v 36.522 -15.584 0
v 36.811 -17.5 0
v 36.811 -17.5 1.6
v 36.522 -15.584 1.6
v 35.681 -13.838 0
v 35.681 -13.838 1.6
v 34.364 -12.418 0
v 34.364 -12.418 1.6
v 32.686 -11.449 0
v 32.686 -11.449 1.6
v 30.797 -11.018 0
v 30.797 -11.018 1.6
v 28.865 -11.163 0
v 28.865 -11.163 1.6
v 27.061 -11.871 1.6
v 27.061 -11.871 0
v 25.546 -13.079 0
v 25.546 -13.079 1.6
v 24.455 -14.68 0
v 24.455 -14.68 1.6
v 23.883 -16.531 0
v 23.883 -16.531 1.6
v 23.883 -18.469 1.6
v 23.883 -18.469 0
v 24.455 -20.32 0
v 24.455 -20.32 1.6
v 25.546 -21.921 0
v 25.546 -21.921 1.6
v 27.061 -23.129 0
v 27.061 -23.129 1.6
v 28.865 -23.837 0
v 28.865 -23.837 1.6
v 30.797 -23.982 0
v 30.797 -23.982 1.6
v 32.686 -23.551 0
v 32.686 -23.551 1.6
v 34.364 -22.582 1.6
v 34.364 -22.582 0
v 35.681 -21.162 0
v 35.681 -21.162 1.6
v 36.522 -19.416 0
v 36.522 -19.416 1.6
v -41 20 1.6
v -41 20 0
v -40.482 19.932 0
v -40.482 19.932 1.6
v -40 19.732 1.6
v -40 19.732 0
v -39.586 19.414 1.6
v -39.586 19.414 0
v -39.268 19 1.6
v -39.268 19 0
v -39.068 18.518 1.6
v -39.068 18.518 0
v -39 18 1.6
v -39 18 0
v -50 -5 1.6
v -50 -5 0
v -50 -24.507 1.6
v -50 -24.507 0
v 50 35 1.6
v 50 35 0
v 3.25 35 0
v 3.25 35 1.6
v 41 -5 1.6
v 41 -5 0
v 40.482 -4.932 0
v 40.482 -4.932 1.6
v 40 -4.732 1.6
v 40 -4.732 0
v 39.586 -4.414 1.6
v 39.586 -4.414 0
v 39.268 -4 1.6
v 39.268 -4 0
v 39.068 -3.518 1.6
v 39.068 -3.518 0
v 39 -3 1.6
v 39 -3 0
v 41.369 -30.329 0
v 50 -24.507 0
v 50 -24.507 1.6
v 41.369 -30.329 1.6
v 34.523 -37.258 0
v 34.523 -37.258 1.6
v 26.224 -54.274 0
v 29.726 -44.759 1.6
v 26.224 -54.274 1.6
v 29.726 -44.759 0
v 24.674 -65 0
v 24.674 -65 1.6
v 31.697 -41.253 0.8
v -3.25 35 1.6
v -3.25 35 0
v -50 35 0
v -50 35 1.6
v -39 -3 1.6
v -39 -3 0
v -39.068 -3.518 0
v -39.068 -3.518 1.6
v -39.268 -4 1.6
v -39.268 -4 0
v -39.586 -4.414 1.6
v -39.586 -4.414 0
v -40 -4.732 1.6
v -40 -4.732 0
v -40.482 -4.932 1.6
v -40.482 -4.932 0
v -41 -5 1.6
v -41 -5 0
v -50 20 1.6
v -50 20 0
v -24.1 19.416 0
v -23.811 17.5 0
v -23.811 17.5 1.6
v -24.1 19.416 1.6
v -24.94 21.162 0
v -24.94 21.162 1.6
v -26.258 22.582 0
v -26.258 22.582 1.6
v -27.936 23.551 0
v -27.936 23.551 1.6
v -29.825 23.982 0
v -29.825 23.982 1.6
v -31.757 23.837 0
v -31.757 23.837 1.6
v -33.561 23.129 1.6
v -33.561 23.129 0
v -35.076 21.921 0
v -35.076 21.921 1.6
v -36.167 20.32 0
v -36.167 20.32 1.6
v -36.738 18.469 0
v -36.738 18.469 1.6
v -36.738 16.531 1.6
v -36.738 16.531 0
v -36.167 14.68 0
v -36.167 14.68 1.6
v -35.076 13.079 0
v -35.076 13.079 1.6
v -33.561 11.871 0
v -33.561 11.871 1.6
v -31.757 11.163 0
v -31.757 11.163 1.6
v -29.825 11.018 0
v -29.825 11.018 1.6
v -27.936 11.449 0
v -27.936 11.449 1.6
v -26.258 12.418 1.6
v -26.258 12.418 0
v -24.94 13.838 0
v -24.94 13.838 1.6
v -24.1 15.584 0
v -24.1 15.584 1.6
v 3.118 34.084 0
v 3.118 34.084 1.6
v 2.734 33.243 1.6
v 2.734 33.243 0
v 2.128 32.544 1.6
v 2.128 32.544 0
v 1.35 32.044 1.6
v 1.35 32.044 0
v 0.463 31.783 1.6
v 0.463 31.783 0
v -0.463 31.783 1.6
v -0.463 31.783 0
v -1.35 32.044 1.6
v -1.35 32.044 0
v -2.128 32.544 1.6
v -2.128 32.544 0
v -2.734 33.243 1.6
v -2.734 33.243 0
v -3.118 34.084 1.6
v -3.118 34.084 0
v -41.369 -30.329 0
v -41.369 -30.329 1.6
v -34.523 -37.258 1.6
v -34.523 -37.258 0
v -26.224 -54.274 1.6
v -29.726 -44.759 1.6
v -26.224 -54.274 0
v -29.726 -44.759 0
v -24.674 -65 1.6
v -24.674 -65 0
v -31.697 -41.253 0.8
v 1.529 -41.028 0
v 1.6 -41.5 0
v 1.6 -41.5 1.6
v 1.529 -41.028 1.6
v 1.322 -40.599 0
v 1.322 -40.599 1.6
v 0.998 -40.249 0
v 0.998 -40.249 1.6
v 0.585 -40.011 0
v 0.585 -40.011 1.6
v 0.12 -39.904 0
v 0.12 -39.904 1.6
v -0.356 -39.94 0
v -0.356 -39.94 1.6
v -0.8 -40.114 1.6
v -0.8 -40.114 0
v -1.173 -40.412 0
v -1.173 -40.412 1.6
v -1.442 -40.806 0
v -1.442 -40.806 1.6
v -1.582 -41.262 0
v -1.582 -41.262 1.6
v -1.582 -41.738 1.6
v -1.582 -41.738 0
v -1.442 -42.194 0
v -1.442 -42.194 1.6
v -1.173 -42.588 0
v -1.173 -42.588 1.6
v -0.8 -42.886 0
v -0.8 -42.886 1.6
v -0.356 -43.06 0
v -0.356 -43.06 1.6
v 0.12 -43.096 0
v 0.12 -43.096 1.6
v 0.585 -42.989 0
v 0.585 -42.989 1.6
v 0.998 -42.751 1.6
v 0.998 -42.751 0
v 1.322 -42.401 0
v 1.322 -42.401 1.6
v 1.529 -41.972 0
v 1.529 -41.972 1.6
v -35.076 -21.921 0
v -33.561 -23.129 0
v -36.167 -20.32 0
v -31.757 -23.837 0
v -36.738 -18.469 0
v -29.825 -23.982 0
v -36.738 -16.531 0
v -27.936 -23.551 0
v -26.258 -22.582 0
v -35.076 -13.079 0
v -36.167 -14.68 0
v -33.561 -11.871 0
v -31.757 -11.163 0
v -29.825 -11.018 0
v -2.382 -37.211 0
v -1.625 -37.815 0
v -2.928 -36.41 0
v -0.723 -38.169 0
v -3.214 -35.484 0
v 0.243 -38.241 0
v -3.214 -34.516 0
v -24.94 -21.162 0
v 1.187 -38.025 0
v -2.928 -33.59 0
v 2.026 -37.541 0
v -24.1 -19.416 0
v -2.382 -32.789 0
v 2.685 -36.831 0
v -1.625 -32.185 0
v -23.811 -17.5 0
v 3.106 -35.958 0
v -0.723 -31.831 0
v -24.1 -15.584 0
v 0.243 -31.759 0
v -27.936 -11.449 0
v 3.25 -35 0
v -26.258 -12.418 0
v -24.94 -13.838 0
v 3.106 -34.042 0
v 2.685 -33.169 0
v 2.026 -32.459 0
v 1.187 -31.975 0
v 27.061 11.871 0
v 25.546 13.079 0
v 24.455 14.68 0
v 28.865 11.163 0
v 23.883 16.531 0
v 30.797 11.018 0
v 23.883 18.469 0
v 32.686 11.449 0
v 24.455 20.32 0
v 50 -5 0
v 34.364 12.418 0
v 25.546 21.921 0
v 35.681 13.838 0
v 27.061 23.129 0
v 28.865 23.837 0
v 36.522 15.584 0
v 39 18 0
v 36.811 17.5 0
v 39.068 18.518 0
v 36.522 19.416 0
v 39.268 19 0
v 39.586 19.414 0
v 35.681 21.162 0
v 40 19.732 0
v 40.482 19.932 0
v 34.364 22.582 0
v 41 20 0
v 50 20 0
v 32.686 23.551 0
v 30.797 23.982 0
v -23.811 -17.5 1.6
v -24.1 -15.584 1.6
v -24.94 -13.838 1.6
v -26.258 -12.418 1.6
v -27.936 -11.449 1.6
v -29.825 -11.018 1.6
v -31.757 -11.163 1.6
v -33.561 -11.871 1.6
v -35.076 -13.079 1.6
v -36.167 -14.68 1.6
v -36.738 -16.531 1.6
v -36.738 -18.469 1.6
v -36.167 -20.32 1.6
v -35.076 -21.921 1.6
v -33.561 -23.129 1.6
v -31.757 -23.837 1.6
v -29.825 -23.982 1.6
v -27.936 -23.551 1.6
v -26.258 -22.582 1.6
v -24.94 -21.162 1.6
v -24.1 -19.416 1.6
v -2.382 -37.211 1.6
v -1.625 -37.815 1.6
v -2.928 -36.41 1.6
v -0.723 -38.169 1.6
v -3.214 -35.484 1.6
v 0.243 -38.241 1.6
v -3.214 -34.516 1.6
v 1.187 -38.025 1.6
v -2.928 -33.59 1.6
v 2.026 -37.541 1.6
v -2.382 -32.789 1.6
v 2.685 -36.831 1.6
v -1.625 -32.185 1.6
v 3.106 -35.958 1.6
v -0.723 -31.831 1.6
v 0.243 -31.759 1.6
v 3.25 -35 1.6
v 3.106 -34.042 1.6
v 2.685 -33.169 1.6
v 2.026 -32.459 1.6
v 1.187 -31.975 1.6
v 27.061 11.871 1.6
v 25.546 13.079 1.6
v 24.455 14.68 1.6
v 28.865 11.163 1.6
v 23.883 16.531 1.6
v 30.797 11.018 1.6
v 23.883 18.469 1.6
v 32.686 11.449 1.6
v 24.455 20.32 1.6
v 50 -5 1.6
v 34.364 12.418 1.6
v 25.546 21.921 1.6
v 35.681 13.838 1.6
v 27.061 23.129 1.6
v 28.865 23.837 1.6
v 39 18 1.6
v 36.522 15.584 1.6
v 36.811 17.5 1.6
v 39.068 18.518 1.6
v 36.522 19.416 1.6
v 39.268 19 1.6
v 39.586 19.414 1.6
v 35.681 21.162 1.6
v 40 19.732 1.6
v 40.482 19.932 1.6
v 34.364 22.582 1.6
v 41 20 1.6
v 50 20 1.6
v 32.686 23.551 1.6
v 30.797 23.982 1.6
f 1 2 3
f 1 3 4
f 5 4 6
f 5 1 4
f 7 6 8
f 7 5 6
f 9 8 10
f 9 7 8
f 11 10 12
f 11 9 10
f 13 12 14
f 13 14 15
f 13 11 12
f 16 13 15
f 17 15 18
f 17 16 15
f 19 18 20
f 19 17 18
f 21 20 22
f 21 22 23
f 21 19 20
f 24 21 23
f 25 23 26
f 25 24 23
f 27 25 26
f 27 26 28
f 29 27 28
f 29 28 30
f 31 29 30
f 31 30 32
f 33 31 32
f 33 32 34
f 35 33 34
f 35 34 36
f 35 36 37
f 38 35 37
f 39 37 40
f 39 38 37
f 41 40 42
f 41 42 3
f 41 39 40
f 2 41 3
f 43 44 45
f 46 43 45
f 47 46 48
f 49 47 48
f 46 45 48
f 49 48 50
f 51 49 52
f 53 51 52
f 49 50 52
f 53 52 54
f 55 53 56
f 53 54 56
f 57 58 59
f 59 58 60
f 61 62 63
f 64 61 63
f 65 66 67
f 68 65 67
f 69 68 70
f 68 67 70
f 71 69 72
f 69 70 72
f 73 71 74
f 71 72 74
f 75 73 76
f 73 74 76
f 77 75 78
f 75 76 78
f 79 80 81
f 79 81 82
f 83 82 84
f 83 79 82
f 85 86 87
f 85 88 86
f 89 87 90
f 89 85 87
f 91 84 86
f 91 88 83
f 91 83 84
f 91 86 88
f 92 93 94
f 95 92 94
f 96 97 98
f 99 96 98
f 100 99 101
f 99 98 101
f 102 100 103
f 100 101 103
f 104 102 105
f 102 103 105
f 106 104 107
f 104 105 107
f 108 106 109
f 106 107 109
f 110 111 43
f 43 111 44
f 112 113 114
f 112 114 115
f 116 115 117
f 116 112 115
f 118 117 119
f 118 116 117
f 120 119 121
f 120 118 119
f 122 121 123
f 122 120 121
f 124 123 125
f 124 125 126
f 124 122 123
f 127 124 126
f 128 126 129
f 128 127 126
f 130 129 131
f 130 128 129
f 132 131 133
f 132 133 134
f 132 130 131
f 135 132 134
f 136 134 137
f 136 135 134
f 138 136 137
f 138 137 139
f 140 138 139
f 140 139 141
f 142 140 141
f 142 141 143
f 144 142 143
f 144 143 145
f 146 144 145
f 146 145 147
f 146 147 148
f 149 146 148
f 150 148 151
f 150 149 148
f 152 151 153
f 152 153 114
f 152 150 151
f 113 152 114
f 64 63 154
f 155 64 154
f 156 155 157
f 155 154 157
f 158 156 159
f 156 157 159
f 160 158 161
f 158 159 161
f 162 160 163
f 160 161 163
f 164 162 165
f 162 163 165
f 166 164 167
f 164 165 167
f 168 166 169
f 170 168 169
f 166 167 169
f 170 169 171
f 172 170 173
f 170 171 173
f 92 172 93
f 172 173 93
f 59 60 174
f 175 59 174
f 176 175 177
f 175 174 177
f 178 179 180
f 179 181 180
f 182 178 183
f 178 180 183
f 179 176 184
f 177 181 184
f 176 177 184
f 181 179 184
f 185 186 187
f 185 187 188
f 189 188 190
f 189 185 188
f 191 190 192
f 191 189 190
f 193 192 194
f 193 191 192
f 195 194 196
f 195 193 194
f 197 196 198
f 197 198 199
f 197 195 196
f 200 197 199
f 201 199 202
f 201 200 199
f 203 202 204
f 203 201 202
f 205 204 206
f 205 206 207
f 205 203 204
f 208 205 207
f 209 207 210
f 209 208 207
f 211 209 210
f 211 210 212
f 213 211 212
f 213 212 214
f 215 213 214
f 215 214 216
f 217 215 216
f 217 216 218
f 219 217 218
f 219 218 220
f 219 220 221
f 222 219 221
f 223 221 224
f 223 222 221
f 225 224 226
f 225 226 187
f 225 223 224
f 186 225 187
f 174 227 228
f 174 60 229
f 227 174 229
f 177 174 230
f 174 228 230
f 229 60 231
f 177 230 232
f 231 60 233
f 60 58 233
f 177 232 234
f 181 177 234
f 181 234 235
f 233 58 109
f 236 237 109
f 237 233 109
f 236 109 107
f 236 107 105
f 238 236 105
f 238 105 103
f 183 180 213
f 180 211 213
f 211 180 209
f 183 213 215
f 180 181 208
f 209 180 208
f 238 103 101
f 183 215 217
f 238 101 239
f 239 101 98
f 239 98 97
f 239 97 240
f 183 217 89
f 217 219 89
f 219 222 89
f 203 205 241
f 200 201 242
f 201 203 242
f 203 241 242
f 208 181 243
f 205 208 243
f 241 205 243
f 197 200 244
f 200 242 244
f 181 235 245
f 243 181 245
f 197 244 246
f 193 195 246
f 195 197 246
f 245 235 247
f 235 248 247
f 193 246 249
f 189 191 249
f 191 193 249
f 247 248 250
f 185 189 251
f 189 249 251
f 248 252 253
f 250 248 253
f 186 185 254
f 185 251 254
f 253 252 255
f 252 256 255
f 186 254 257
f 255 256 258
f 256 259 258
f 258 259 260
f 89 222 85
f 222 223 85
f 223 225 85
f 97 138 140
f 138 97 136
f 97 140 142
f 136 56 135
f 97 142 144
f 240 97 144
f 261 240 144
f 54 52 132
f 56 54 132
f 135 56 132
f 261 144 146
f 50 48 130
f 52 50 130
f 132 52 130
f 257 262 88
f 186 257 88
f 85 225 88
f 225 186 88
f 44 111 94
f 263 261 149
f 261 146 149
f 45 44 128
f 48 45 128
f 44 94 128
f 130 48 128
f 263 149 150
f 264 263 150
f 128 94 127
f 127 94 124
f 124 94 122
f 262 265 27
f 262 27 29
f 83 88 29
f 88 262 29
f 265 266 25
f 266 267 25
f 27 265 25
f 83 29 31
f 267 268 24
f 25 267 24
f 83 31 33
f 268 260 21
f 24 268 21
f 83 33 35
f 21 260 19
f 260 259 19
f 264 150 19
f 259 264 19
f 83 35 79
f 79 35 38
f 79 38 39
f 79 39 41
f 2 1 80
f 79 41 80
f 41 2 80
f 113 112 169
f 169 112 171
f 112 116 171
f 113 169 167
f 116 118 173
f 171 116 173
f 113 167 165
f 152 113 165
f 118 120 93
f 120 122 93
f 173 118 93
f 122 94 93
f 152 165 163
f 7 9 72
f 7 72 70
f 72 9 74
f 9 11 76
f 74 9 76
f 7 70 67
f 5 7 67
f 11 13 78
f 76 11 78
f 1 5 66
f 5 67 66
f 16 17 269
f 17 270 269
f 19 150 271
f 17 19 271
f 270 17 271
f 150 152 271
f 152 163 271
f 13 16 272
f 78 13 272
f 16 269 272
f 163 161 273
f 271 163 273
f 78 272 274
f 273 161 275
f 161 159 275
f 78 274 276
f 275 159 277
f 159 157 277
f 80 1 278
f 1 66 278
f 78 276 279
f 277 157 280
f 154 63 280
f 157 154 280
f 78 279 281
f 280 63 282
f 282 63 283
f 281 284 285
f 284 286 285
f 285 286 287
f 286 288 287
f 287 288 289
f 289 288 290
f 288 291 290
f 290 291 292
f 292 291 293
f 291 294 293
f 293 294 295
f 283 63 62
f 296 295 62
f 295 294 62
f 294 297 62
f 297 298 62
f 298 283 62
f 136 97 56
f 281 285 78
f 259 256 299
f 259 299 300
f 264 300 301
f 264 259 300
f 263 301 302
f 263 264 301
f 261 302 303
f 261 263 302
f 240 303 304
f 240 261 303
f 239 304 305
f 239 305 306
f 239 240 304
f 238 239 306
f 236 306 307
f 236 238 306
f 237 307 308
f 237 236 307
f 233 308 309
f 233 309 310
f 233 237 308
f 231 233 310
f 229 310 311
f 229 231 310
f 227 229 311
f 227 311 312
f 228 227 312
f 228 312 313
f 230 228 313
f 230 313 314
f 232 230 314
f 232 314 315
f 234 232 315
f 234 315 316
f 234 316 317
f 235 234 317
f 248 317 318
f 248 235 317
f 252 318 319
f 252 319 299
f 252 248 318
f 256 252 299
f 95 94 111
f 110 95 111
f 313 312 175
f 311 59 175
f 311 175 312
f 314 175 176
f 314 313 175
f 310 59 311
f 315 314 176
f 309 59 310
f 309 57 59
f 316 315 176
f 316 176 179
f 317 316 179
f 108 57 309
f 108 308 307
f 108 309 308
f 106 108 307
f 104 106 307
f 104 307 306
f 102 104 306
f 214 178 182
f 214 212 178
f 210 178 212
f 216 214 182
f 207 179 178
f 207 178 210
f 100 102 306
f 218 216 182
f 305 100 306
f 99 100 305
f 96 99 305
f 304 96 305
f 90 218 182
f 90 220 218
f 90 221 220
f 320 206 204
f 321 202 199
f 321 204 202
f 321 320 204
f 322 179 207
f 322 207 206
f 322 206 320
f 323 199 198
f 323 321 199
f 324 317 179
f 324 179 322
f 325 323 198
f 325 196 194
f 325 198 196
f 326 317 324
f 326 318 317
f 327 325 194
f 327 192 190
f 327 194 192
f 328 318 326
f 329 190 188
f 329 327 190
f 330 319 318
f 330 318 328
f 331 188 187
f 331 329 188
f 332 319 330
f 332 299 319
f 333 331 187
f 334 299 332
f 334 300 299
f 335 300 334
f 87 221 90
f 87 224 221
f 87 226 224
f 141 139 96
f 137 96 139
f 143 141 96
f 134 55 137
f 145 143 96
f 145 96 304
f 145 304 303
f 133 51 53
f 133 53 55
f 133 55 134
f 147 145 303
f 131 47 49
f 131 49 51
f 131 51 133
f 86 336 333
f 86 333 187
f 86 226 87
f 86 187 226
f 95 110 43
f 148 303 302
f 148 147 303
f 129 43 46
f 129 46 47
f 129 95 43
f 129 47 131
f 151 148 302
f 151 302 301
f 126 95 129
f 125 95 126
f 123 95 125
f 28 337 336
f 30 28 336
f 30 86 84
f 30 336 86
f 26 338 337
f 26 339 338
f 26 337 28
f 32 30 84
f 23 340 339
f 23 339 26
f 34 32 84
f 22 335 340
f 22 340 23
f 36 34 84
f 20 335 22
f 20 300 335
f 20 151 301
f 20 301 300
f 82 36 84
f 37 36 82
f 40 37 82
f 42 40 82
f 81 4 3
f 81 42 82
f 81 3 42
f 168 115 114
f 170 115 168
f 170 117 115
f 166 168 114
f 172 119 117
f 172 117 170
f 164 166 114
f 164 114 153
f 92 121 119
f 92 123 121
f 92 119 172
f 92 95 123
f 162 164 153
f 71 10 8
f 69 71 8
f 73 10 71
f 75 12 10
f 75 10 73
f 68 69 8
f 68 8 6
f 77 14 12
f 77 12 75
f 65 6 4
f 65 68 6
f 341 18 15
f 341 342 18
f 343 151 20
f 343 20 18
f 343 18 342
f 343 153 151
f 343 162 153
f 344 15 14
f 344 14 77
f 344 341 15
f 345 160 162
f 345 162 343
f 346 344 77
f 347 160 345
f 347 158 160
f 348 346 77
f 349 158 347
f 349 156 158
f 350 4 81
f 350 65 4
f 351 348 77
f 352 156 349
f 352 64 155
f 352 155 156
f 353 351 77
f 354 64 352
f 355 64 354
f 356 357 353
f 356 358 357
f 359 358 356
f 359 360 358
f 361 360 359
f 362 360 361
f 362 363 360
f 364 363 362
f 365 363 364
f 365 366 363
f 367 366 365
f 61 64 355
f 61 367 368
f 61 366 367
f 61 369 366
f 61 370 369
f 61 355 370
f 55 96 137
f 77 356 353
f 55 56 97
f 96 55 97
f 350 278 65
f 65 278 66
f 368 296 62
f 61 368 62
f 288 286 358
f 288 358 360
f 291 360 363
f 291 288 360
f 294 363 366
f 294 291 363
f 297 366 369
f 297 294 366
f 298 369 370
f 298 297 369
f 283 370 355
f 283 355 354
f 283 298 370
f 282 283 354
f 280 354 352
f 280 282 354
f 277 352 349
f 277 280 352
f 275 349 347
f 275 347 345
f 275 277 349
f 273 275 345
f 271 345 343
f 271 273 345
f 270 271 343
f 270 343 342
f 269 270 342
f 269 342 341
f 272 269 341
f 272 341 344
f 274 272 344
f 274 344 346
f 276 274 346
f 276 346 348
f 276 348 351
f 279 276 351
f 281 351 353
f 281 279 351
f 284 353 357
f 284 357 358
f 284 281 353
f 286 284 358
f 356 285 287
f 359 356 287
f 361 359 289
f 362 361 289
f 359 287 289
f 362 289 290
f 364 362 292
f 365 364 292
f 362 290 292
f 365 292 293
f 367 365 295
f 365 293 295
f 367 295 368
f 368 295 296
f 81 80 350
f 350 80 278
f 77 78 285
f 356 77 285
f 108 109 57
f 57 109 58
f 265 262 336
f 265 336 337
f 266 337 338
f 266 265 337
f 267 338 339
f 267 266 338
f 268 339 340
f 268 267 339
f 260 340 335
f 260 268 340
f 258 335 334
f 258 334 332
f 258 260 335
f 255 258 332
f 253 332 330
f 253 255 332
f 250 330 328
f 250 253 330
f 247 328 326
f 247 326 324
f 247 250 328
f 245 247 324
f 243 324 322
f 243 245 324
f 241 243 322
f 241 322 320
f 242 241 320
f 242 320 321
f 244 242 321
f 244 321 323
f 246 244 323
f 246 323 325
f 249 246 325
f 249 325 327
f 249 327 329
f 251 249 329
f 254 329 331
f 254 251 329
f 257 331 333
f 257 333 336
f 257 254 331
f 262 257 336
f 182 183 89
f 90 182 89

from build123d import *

# Parameters (mm, degrees)
SKETCH_1_R      = 3.25
SKETCH_1_R_2    = 6.5
SKETCH_1_R_3    = 1.6
EXTRUDE_2_DEPTH = 1.6


with BuildPart() as part:
    # 草图1 → 凸台-拉伸2 (new body)
    with BuildSketch(Plane.XY):
        with BuildLine():
            Line((-50, 20), (-41, 20))
            ThreePointArc((-41, 20), (-39.585786438, 19.414213562), (-39, 18))
            Line((-39, 18), (-39, -3))
            ThreePointArc((-39, -3), (-39.585786438, -4.414213562), (-41, -5))
            Line((-41, -5), (-50, -5))
            Line((-50, -5), (-50, -24.506949679))
            add(Edge.make_bspline(
                [(-50, -24.506949679), (-26.057041225, -37.751626241), (-24.673757374, -65)],
                knots=[0, 0, 0, 1, 1, 1], degree=2))
            Line((-24.673757374, -65), (24.673757374, -65))
            add(Edge.make_bspline(
                [(50, -24.506949679), (26.057041225, -37.751626241), (24.673757374, -65)],
                knots=[0, 0, 0, 1, 1, 1], degree=2))
            Line((50, -24.506949679), (50, -5))
            Line((50, -5), (41, -5))
            ThreePointArc((41, -5), (39.585786438, -4.414213562), (39, -3))
            Line((39, -3), (39, 18))
            ThreePointArc((39, 18), (39.585786438, 19.414213562), (41, 20))
            Line((41, 20), (50, 20))
            Line((50, 20), (50, 35))
            Line((50, 35), (3.25, 35))
            ThreePointArc((3.25, 35), (0, 31.75), (-3.25, 35))
            Line((-3.25, 35), (-50, 35))
            Line((-50, 35), (-50, 20))
        make_face()
        with Locations((0, -35)):
            Circle(SKETCH_1_R, mode=Mode.SUBTRACT)
        with Locations((30.310889132, -17.5)):
            Circle(SKETCH_1_R_2, mode=Mode.SUBTRACT)
        with Locations((30.310889132, 17.5)):
            Circle(SKETCH_1_R_2, mode=Mode.SUBTRACT)
        with Locations((-30.310889132, 17.5)):
            Circle(SKETCH_1_R_2, mode=Mode.SUBTRACT)
        with Locations((-30.310889132, -17.5)):
            Circle(SKETCH_1_R_2, mode=Mode.SUBTRACT)
        with Locations((0, -41.5)):
            Circle(SKETCH_1_R_3, mode=Mode.SUBTRACT)
    extrude(amount=EXTRUDE_2_DEPTH)


solid = part.part
